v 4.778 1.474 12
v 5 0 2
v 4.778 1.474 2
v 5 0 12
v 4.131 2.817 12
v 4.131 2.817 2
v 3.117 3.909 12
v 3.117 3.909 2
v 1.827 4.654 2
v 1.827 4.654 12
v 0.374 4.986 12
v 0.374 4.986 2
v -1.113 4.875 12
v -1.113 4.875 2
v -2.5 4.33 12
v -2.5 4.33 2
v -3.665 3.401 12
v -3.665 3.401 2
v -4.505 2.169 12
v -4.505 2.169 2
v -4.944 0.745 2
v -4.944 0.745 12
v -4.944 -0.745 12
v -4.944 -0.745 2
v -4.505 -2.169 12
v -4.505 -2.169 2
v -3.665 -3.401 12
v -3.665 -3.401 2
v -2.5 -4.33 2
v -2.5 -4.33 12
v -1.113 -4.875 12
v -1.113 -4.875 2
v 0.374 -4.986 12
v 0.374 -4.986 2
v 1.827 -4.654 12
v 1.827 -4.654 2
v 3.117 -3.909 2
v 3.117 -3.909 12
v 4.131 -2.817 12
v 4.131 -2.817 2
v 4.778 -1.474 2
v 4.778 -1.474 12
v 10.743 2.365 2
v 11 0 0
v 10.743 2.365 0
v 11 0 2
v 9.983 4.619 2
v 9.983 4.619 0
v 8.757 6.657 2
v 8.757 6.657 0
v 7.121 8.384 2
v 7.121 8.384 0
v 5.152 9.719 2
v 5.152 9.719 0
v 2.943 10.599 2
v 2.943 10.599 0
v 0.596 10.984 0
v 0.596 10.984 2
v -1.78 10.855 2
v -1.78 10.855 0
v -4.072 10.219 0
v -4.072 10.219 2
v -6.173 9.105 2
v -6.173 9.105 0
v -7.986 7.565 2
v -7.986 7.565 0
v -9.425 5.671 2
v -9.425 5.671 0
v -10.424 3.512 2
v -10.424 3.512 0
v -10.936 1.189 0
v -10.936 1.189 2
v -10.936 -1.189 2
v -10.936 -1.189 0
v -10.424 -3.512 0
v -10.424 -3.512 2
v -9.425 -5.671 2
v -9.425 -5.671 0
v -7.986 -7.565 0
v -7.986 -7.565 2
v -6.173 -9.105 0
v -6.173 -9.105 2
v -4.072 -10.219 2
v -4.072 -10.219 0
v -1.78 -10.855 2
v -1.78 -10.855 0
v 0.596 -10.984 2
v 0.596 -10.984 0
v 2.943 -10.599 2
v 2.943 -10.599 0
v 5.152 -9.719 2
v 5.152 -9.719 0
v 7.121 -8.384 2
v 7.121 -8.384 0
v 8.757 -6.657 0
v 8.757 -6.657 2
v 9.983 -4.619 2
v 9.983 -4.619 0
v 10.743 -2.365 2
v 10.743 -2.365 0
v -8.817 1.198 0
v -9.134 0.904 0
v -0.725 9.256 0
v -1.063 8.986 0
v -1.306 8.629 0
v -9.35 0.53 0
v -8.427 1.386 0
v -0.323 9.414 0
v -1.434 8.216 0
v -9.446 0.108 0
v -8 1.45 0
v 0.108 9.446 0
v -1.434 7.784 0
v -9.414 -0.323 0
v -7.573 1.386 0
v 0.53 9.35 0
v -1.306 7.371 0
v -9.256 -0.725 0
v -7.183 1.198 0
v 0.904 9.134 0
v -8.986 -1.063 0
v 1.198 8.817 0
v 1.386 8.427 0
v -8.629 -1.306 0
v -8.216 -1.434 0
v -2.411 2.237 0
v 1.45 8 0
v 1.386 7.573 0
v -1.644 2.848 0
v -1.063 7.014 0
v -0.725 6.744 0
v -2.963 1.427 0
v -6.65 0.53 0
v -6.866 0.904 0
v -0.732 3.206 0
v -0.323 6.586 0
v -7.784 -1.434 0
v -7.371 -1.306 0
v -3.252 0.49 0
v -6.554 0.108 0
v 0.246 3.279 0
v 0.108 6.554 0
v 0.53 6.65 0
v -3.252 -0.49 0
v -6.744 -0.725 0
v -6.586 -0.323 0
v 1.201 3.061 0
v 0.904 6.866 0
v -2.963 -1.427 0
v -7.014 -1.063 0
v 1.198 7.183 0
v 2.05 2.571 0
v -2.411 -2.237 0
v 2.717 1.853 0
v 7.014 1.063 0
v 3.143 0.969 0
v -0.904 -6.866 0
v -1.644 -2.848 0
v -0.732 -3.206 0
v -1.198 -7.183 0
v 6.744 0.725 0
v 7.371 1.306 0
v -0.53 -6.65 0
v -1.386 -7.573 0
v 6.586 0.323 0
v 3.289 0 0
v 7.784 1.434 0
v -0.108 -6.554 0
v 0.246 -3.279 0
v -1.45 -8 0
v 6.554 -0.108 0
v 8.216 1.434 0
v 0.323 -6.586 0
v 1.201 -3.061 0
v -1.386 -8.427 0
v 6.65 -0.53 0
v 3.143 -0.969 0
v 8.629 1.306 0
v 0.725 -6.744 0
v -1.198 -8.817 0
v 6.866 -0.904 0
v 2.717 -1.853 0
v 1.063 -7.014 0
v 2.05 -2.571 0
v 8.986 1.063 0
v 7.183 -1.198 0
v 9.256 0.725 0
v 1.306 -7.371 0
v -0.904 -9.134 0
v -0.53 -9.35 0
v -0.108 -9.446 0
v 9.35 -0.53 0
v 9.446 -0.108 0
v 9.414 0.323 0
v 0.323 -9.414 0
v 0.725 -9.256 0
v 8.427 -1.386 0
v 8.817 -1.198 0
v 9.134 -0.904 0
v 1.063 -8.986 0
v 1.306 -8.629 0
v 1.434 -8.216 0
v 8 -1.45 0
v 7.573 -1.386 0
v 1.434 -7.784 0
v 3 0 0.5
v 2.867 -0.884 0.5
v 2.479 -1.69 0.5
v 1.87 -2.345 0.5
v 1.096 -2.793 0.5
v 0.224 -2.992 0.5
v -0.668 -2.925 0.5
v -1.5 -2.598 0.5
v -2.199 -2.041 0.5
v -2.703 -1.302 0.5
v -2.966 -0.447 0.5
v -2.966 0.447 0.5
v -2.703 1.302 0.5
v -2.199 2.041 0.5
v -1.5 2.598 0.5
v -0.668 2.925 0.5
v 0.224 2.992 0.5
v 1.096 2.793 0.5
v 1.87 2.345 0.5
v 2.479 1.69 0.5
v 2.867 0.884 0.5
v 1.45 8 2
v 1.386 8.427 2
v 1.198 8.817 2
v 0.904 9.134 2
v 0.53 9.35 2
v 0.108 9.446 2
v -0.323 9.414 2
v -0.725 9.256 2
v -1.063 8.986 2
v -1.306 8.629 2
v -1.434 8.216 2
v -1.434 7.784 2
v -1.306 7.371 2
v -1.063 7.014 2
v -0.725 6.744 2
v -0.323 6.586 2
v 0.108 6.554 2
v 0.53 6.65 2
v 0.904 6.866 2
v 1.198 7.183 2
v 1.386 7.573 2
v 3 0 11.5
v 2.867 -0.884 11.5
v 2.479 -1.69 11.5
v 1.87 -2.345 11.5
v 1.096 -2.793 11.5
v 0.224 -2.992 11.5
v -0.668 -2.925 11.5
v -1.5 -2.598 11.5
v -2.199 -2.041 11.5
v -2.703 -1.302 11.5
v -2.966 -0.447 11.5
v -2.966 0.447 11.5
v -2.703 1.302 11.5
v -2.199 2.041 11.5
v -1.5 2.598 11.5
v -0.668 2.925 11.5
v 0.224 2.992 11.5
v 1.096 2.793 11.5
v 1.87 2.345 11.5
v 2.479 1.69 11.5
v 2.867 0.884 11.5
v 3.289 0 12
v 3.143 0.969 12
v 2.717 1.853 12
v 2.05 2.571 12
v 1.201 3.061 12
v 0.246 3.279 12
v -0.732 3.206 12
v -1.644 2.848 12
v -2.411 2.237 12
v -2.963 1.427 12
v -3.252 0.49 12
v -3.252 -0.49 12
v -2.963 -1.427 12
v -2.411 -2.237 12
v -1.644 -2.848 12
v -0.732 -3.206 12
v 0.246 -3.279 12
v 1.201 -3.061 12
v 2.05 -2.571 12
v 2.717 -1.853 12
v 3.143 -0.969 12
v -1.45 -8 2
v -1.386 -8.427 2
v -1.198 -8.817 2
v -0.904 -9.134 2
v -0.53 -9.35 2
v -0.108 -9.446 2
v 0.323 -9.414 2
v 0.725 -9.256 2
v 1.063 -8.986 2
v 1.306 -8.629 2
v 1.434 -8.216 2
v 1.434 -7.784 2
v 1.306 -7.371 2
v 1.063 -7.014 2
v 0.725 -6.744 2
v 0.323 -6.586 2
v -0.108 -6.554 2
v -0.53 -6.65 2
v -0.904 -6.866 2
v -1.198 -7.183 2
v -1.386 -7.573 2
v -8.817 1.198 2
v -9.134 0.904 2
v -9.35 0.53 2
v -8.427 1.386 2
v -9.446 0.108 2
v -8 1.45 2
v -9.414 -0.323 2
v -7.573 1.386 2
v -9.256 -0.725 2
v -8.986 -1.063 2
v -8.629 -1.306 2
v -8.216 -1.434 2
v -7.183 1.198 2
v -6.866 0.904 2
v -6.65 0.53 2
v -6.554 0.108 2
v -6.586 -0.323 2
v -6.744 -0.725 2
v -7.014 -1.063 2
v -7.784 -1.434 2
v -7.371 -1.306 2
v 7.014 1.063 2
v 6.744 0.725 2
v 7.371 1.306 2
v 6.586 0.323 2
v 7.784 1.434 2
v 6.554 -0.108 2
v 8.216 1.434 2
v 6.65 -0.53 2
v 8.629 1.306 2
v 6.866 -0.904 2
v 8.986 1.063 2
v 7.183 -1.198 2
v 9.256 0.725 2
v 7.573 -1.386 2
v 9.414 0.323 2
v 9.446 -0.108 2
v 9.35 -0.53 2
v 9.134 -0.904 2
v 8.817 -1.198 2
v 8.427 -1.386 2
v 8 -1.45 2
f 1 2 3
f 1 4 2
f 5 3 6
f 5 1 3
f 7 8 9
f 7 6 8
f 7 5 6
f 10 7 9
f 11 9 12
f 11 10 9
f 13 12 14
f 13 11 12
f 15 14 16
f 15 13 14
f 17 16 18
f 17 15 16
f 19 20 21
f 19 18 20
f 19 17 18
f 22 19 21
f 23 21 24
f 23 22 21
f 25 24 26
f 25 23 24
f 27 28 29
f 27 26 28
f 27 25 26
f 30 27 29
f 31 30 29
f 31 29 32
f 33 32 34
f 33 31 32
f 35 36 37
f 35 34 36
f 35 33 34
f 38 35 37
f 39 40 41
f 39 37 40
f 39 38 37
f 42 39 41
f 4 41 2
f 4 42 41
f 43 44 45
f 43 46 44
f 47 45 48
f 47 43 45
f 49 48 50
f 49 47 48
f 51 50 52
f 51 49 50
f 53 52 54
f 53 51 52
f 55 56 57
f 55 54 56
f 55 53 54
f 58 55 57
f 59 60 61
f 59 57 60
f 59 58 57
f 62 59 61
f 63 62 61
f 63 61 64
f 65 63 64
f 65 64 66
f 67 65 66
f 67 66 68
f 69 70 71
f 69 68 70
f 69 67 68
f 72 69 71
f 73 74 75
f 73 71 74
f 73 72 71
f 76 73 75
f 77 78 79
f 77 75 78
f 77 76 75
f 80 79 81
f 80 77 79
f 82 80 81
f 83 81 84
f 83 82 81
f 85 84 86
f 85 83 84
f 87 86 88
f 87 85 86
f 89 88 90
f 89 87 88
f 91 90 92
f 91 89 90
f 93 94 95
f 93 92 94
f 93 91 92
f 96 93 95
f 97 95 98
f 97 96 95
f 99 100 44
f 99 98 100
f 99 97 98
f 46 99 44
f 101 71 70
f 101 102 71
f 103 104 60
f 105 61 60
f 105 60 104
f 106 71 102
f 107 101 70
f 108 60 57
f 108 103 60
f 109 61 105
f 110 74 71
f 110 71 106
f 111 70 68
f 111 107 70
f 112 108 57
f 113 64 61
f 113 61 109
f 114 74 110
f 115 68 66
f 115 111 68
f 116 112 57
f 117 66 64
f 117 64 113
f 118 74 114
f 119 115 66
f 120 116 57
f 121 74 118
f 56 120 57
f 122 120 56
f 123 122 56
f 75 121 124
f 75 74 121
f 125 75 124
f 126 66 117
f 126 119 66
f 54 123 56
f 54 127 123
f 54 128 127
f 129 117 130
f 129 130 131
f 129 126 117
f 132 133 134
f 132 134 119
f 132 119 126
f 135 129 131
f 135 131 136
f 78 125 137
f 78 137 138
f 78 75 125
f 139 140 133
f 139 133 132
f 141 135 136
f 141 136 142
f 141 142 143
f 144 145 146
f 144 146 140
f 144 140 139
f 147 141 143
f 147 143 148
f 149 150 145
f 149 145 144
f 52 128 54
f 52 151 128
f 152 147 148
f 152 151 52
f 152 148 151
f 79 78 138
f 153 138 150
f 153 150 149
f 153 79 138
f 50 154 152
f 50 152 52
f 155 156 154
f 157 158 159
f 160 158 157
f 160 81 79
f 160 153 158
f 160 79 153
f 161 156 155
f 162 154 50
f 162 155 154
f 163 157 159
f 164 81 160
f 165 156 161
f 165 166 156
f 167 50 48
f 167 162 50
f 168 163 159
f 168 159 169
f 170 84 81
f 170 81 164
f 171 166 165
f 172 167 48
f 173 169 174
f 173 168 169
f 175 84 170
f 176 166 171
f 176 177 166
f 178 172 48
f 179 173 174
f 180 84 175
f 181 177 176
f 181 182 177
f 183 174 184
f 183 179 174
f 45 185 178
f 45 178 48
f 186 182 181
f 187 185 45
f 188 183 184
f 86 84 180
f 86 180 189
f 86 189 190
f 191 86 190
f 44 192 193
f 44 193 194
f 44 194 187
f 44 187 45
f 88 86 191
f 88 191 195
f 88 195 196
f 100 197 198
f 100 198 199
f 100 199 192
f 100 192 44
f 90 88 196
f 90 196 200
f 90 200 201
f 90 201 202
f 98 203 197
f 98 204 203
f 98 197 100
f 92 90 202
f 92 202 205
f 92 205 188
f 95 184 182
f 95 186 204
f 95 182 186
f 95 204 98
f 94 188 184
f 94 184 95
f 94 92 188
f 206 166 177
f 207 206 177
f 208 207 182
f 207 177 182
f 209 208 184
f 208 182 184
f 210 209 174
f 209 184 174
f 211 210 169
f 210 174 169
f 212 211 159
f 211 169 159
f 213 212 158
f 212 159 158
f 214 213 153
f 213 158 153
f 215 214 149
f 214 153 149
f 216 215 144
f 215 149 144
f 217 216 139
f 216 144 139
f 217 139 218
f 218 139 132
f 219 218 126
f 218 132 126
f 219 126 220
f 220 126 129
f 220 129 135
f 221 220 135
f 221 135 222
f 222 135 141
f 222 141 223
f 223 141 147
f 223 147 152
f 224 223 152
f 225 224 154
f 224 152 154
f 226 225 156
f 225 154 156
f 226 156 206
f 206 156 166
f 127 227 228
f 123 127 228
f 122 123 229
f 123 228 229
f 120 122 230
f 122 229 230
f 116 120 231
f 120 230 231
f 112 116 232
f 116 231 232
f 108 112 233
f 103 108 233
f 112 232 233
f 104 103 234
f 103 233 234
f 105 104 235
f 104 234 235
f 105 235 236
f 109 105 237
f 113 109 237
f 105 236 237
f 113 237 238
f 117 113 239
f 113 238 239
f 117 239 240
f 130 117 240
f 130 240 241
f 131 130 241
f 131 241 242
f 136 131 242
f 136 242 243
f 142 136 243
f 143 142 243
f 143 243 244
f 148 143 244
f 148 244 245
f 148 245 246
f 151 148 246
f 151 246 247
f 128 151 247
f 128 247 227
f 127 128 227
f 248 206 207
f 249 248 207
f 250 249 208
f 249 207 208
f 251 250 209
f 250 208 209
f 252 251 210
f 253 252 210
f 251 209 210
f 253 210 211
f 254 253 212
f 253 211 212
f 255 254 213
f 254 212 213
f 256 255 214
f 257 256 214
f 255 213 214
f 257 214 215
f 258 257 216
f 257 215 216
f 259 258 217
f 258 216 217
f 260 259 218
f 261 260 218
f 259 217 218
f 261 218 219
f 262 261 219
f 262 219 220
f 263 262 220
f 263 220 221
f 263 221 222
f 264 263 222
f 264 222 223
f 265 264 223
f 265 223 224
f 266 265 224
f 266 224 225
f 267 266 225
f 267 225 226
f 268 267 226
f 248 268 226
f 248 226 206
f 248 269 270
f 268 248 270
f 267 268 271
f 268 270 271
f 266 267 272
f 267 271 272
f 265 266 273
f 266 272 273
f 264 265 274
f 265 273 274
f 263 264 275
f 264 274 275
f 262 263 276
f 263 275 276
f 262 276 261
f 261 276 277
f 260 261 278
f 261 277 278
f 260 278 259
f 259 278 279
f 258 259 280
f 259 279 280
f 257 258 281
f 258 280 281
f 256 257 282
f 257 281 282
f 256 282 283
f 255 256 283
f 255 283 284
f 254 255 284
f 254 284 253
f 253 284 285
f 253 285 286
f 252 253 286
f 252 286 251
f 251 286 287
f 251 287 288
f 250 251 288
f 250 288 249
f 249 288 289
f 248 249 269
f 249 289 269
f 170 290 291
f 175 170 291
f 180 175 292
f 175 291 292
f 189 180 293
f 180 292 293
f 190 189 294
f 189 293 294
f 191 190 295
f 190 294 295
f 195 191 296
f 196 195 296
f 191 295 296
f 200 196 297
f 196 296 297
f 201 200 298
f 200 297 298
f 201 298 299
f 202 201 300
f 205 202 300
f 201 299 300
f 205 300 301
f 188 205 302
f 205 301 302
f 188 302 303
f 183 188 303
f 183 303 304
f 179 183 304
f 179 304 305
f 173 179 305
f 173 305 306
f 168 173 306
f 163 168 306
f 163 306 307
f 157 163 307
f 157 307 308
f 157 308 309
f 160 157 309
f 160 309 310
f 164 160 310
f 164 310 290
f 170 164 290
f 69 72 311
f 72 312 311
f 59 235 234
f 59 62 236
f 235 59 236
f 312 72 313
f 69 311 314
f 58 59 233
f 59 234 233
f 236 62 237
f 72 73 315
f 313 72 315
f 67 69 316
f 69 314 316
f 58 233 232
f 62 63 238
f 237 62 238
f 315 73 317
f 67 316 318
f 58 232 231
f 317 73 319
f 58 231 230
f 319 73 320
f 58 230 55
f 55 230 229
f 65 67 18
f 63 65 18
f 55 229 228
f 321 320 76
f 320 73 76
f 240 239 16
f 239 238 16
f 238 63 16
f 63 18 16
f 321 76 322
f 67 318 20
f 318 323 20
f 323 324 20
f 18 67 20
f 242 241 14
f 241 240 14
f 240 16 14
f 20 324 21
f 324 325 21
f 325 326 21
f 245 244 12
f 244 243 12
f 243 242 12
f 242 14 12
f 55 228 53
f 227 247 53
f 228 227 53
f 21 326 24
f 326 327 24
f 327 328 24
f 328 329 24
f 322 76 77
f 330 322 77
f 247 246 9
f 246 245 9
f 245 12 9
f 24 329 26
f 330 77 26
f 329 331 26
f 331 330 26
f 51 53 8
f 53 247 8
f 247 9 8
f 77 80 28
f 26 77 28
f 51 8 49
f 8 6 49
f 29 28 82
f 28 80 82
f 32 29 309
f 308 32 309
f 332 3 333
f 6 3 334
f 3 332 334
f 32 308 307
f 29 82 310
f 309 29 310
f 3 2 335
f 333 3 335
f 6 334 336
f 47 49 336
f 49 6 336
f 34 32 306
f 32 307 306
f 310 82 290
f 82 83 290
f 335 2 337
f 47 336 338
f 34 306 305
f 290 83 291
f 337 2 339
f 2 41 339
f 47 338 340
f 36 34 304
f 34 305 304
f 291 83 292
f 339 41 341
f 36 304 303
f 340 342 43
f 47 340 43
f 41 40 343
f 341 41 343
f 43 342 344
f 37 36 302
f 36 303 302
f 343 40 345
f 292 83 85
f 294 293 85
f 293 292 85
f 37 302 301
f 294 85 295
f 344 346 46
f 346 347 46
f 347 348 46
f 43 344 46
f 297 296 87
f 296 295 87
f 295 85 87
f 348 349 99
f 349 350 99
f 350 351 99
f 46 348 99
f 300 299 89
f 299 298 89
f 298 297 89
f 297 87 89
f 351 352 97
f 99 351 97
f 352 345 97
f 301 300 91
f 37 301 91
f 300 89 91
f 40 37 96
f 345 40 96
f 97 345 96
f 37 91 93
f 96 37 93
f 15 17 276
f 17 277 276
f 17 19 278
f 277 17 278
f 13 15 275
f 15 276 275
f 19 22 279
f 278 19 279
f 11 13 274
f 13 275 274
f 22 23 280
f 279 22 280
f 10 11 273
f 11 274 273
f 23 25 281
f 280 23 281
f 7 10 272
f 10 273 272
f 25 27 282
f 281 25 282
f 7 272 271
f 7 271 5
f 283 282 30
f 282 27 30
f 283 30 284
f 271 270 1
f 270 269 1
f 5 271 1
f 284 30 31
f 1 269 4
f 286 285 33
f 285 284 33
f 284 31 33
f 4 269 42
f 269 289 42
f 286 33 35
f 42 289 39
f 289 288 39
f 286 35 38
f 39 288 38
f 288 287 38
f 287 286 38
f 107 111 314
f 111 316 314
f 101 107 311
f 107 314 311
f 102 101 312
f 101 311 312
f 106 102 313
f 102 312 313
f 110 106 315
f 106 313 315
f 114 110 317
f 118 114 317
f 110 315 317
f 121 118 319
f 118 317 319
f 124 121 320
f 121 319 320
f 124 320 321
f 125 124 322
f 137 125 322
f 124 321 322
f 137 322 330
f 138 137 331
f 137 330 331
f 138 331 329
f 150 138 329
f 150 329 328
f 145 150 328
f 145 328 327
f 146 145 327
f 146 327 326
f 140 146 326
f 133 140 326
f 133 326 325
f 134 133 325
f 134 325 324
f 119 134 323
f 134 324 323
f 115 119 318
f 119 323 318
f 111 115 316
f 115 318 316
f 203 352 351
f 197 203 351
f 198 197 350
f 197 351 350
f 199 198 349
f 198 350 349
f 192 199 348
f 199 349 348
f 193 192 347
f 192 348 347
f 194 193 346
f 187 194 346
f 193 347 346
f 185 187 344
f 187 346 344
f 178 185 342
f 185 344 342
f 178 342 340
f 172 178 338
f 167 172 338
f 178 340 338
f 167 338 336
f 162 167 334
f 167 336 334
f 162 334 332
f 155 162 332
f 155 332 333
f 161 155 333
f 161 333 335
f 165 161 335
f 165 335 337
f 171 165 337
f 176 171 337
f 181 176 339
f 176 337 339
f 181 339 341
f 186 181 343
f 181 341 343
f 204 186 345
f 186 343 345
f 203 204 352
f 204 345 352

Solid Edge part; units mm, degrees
sketch "Sketch1" plane through (0, 0, 0) normal (0, -1, 0) x (1, 0, 0)
  line L0 (3, 12) -> (3, 0)
  line L1 (3, 0) -> (11, 0)
  line L2 (11, 0) -> (11, 2)
  line L3 (11, 2) -> (5, 2)
  line L4 (5, 2) -> (5, 12)
  line L5 (5, 12) -> (3, 12)
  dimension "D1" = 12
  dimension "D2" = 2
revolve "RevolvedProtrusion1" add sketch "Sketch1" angle 360 about axis through (0, 0, 54) along (0, 0, -1)
hole "Hole1" at (8, 0, 2) direction (0, 0, -1) diameter 2.9 end up to next
pattern_circular "Pattern1" count 4 over 360 about axis through (0, 0, 2) along (0, 0, 1) of "Hole1"
chamfer "Chamfer_1" distance 0.5 angle 30 2 edges at (-3, 0, 12) (-3, 0, 0) measured on face at (1.6602, -2.4988, 9.88)
properties material "Stainless steel"
